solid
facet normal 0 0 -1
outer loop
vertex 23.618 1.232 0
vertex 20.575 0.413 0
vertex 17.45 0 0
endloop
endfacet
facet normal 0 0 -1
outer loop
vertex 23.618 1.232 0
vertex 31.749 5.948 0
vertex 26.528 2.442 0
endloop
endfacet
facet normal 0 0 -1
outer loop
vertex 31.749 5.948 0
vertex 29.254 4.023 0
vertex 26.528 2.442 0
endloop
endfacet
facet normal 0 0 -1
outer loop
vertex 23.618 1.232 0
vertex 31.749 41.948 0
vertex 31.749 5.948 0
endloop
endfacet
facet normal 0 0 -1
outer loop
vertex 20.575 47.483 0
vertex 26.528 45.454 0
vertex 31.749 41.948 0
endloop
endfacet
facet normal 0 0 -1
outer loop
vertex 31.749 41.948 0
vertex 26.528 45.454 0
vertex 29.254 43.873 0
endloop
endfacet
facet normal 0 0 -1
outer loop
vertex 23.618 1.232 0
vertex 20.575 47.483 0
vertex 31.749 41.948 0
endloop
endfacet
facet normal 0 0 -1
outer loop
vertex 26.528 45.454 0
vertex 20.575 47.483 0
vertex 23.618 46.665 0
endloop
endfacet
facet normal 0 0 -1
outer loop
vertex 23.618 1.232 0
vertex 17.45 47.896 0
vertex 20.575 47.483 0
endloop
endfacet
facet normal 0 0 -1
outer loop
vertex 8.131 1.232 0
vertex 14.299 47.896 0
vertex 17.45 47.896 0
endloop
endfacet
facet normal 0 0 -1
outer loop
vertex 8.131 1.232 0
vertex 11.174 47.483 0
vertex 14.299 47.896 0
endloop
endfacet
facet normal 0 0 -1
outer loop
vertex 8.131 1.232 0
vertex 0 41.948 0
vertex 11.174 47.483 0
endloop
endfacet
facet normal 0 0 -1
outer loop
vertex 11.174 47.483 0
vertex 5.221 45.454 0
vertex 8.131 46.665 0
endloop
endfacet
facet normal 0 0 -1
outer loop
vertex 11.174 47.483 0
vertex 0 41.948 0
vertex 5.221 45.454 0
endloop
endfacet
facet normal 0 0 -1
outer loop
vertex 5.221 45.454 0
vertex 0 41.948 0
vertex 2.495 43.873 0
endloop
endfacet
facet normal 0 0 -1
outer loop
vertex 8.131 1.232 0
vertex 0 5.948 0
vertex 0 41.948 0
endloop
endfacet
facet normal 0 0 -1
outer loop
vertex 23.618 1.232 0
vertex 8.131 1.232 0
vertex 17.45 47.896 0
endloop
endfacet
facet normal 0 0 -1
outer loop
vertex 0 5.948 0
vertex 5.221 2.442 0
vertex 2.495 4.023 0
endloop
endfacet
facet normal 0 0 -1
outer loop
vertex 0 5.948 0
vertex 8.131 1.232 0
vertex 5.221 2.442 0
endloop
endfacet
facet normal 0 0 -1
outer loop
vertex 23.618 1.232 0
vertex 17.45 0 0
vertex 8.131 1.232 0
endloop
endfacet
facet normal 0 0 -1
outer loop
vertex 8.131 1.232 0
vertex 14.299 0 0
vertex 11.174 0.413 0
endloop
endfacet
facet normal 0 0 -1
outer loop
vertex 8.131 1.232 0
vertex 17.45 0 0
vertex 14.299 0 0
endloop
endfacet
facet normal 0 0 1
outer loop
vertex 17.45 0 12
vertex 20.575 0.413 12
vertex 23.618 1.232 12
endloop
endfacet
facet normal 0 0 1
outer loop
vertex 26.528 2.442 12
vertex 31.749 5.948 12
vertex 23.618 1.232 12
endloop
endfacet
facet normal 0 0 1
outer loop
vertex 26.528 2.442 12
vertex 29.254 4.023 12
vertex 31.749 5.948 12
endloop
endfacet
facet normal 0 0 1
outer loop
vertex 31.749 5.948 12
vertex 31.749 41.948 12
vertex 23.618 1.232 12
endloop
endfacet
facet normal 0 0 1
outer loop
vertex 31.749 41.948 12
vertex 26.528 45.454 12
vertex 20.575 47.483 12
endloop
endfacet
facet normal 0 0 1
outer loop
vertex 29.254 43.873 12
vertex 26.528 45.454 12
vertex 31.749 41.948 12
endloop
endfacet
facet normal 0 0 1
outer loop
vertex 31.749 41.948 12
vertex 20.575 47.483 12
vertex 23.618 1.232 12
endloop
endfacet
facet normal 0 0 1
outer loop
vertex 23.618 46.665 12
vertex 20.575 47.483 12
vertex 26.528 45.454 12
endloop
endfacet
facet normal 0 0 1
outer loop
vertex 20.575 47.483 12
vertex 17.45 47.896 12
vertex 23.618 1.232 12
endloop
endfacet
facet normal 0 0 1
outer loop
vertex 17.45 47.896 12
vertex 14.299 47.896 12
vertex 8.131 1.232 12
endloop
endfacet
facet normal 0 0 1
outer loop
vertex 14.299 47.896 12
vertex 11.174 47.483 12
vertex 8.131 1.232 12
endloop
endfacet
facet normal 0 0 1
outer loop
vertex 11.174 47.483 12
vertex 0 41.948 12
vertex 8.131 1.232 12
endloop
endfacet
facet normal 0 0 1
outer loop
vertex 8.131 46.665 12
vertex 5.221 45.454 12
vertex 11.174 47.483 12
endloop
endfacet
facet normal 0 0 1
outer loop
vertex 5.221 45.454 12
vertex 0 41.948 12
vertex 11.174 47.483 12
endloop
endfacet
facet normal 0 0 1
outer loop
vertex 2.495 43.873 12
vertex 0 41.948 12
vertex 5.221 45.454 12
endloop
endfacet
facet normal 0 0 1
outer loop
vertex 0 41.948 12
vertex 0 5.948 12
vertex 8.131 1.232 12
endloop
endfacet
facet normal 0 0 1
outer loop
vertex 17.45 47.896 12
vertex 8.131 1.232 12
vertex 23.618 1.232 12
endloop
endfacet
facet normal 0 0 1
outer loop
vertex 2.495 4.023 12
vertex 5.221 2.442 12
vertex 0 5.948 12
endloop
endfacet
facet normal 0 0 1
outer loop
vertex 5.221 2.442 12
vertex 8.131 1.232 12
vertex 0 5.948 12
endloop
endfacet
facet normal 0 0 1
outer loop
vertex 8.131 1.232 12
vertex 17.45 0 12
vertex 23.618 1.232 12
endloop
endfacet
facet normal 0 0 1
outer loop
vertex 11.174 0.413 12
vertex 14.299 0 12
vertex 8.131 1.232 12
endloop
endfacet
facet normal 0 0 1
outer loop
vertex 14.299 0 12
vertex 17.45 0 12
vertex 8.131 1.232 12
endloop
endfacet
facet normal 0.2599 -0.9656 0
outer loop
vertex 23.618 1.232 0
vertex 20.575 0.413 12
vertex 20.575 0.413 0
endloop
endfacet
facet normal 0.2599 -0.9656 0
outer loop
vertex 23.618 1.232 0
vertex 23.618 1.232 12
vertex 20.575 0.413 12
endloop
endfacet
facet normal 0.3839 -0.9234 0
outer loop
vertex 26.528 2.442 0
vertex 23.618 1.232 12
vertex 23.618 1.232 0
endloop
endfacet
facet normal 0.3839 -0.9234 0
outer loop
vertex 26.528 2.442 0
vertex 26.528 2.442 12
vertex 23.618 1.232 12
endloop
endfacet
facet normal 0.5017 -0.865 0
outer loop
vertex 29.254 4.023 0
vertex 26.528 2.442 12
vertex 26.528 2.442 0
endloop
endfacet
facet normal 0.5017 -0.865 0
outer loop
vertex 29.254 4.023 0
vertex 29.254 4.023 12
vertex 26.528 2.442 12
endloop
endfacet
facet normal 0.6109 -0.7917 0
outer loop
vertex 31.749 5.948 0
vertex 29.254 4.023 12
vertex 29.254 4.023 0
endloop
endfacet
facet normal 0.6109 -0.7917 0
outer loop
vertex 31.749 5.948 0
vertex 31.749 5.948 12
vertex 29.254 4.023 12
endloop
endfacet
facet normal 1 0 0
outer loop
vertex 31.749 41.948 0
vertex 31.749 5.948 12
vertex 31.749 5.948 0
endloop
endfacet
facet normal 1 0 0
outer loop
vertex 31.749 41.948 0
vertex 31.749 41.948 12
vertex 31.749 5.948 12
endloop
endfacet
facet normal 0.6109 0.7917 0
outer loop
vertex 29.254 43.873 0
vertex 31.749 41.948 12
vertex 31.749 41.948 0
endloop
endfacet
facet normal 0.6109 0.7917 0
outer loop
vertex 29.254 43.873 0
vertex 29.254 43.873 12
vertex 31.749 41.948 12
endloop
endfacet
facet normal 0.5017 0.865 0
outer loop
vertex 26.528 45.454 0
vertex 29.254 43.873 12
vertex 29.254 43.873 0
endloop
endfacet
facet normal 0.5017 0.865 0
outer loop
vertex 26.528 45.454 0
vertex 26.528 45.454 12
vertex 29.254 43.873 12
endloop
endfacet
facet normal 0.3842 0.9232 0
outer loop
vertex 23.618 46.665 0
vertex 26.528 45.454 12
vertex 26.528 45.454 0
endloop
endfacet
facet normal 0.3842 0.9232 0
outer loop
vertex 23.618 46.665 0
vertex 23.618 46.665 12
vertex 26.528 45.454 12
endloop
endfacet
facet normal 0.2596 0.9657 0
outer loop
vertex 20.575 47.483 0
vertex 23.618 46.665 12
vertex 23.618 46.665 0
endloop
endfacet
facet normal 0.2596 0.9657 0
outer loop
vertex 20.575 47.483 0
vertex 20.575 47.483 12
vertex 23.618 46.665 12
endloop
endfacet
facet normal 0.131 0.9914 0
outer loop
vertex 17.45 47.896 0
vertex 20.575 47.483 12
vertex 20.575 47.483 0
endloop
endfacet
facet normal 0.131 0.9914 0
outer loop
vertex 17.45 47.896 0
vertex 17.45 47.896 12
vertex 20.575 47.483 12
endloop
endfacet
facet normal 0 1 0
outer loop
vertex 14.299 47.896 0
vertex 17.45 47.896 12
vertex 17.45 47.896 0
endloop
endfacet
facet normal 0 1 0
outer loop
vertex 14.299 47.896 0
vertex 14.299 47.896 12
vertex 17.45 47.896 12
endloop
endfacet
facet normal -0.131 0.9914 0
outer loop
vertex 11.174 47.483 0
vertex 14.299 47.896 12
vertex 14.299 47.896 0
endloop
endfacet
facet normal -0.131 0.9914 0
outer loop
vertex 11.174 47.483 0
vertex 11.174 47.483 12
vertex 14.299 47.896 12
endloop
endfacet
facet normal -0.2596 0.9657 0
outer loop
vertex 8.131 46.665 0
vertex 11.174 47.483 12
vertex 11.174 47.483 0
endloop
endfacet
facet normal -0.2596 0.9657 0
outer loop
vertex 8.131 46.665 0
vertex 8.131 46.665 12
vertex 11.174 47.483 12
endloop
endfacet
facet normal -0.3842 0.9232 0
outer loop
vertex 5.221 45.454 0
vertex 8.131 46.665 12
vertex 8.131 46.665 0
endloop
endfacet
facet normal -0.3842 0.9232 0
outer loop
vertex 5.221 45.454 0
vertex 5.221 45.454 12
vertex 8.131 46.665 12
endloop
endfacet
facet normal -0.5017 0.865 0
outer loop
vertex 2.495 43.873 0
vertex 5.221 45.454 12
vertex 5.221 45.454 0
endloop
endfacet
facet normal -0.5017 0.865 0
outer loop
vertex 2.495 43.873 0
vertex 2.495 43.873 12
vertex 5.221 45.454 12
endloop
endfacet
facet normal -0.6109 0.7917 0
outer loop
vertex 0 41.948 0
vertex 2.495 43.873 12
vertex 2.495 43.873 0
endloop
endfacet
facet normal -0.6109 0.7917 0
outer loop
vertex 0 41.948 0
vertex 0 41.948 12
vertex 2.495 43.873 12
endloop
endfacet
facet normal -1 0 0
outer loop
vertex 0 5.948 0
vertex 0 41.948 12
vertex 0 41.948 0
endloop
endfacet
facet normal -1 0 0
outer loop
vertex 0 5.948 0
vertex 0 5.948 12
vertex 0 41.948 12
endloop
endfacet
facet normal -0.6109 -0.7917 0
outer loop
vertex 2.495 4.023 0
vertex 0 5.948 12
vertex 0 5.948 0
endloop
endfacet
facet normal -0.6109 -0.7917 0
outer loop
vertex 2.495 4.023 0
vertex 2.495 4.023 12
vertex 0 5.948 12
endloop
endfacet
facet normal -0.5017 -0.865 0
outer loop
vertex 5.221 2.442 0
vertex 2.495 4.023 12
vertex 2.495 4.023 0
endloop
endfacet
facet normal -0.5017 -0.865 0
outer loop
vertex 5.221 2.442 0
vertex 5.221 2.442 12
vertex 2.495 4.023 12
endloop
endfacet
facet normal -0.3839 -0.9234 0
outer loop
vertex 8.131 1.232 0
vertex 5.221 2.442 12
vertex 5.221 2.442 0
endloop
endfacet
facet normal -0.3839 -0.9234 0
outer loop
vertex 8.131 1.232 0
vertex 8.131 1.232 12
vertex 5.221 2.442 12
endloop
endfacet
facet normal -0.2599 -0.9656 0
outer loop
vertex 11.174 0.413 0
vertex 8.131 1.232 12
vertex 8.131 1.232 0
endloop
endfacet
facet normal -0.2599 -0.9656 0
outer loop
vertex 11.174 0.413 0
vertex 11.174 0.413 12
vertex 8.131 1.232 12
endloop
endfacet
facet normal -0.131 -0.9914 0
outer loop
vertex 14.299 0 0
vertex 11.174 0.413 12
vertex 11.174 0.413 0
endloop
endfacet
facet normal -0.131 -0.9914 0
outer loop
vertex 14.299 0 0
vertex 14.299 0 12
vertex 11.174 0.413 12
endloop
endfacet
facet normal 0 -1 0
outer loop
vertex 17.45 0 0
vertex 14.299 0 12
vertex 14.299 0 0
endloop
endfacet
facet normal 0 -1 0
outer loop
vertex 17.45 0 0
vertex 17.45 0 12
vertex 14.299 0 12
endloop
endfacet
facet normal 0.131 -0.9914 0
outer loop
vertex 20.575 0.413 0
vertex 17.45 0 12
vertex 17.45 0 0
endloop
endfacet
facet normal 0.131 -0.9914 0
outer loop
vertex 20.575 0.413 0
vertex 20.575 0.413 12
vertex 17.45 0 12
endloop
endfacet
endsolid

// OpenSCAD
$fn = 32;

// ----------------------------------------------------------------------
// Eccentric disc: double_d, 12 mm thick
// ----------------------------------------------------------------------

// --- parameters (mm) ---
profile_height = 12;      // extrusion height
profile_points = 24;      // points of the closed outline

profile = [[31.749, 41.948], [29.254, 43.873], [26.528, 45.454], [23.618, 46.665], [20.575, 47.483], [17.45, 47.896], [14.299, 47.896], [11.174, 47.483], [8.131, 46.665], [5.221, 45.454], [2.495, 43.873], [0, 41.948], [0, 5.948], [2.495, 4.023], [5.221, 2.442], [8.131, 1.232], [11.174, 0.413], [14.299, 0], [17.45, 0], [20.575, 0.413], [23.618, 1.232], [26.528, 2.442], [29.254, 4.023], [31.749, 5.948]];  // single closed polygon, 24 points, counter clockwise

// --- the one profile operation ---
linear_extrude(height = profile_height) polygon(points = profile);
